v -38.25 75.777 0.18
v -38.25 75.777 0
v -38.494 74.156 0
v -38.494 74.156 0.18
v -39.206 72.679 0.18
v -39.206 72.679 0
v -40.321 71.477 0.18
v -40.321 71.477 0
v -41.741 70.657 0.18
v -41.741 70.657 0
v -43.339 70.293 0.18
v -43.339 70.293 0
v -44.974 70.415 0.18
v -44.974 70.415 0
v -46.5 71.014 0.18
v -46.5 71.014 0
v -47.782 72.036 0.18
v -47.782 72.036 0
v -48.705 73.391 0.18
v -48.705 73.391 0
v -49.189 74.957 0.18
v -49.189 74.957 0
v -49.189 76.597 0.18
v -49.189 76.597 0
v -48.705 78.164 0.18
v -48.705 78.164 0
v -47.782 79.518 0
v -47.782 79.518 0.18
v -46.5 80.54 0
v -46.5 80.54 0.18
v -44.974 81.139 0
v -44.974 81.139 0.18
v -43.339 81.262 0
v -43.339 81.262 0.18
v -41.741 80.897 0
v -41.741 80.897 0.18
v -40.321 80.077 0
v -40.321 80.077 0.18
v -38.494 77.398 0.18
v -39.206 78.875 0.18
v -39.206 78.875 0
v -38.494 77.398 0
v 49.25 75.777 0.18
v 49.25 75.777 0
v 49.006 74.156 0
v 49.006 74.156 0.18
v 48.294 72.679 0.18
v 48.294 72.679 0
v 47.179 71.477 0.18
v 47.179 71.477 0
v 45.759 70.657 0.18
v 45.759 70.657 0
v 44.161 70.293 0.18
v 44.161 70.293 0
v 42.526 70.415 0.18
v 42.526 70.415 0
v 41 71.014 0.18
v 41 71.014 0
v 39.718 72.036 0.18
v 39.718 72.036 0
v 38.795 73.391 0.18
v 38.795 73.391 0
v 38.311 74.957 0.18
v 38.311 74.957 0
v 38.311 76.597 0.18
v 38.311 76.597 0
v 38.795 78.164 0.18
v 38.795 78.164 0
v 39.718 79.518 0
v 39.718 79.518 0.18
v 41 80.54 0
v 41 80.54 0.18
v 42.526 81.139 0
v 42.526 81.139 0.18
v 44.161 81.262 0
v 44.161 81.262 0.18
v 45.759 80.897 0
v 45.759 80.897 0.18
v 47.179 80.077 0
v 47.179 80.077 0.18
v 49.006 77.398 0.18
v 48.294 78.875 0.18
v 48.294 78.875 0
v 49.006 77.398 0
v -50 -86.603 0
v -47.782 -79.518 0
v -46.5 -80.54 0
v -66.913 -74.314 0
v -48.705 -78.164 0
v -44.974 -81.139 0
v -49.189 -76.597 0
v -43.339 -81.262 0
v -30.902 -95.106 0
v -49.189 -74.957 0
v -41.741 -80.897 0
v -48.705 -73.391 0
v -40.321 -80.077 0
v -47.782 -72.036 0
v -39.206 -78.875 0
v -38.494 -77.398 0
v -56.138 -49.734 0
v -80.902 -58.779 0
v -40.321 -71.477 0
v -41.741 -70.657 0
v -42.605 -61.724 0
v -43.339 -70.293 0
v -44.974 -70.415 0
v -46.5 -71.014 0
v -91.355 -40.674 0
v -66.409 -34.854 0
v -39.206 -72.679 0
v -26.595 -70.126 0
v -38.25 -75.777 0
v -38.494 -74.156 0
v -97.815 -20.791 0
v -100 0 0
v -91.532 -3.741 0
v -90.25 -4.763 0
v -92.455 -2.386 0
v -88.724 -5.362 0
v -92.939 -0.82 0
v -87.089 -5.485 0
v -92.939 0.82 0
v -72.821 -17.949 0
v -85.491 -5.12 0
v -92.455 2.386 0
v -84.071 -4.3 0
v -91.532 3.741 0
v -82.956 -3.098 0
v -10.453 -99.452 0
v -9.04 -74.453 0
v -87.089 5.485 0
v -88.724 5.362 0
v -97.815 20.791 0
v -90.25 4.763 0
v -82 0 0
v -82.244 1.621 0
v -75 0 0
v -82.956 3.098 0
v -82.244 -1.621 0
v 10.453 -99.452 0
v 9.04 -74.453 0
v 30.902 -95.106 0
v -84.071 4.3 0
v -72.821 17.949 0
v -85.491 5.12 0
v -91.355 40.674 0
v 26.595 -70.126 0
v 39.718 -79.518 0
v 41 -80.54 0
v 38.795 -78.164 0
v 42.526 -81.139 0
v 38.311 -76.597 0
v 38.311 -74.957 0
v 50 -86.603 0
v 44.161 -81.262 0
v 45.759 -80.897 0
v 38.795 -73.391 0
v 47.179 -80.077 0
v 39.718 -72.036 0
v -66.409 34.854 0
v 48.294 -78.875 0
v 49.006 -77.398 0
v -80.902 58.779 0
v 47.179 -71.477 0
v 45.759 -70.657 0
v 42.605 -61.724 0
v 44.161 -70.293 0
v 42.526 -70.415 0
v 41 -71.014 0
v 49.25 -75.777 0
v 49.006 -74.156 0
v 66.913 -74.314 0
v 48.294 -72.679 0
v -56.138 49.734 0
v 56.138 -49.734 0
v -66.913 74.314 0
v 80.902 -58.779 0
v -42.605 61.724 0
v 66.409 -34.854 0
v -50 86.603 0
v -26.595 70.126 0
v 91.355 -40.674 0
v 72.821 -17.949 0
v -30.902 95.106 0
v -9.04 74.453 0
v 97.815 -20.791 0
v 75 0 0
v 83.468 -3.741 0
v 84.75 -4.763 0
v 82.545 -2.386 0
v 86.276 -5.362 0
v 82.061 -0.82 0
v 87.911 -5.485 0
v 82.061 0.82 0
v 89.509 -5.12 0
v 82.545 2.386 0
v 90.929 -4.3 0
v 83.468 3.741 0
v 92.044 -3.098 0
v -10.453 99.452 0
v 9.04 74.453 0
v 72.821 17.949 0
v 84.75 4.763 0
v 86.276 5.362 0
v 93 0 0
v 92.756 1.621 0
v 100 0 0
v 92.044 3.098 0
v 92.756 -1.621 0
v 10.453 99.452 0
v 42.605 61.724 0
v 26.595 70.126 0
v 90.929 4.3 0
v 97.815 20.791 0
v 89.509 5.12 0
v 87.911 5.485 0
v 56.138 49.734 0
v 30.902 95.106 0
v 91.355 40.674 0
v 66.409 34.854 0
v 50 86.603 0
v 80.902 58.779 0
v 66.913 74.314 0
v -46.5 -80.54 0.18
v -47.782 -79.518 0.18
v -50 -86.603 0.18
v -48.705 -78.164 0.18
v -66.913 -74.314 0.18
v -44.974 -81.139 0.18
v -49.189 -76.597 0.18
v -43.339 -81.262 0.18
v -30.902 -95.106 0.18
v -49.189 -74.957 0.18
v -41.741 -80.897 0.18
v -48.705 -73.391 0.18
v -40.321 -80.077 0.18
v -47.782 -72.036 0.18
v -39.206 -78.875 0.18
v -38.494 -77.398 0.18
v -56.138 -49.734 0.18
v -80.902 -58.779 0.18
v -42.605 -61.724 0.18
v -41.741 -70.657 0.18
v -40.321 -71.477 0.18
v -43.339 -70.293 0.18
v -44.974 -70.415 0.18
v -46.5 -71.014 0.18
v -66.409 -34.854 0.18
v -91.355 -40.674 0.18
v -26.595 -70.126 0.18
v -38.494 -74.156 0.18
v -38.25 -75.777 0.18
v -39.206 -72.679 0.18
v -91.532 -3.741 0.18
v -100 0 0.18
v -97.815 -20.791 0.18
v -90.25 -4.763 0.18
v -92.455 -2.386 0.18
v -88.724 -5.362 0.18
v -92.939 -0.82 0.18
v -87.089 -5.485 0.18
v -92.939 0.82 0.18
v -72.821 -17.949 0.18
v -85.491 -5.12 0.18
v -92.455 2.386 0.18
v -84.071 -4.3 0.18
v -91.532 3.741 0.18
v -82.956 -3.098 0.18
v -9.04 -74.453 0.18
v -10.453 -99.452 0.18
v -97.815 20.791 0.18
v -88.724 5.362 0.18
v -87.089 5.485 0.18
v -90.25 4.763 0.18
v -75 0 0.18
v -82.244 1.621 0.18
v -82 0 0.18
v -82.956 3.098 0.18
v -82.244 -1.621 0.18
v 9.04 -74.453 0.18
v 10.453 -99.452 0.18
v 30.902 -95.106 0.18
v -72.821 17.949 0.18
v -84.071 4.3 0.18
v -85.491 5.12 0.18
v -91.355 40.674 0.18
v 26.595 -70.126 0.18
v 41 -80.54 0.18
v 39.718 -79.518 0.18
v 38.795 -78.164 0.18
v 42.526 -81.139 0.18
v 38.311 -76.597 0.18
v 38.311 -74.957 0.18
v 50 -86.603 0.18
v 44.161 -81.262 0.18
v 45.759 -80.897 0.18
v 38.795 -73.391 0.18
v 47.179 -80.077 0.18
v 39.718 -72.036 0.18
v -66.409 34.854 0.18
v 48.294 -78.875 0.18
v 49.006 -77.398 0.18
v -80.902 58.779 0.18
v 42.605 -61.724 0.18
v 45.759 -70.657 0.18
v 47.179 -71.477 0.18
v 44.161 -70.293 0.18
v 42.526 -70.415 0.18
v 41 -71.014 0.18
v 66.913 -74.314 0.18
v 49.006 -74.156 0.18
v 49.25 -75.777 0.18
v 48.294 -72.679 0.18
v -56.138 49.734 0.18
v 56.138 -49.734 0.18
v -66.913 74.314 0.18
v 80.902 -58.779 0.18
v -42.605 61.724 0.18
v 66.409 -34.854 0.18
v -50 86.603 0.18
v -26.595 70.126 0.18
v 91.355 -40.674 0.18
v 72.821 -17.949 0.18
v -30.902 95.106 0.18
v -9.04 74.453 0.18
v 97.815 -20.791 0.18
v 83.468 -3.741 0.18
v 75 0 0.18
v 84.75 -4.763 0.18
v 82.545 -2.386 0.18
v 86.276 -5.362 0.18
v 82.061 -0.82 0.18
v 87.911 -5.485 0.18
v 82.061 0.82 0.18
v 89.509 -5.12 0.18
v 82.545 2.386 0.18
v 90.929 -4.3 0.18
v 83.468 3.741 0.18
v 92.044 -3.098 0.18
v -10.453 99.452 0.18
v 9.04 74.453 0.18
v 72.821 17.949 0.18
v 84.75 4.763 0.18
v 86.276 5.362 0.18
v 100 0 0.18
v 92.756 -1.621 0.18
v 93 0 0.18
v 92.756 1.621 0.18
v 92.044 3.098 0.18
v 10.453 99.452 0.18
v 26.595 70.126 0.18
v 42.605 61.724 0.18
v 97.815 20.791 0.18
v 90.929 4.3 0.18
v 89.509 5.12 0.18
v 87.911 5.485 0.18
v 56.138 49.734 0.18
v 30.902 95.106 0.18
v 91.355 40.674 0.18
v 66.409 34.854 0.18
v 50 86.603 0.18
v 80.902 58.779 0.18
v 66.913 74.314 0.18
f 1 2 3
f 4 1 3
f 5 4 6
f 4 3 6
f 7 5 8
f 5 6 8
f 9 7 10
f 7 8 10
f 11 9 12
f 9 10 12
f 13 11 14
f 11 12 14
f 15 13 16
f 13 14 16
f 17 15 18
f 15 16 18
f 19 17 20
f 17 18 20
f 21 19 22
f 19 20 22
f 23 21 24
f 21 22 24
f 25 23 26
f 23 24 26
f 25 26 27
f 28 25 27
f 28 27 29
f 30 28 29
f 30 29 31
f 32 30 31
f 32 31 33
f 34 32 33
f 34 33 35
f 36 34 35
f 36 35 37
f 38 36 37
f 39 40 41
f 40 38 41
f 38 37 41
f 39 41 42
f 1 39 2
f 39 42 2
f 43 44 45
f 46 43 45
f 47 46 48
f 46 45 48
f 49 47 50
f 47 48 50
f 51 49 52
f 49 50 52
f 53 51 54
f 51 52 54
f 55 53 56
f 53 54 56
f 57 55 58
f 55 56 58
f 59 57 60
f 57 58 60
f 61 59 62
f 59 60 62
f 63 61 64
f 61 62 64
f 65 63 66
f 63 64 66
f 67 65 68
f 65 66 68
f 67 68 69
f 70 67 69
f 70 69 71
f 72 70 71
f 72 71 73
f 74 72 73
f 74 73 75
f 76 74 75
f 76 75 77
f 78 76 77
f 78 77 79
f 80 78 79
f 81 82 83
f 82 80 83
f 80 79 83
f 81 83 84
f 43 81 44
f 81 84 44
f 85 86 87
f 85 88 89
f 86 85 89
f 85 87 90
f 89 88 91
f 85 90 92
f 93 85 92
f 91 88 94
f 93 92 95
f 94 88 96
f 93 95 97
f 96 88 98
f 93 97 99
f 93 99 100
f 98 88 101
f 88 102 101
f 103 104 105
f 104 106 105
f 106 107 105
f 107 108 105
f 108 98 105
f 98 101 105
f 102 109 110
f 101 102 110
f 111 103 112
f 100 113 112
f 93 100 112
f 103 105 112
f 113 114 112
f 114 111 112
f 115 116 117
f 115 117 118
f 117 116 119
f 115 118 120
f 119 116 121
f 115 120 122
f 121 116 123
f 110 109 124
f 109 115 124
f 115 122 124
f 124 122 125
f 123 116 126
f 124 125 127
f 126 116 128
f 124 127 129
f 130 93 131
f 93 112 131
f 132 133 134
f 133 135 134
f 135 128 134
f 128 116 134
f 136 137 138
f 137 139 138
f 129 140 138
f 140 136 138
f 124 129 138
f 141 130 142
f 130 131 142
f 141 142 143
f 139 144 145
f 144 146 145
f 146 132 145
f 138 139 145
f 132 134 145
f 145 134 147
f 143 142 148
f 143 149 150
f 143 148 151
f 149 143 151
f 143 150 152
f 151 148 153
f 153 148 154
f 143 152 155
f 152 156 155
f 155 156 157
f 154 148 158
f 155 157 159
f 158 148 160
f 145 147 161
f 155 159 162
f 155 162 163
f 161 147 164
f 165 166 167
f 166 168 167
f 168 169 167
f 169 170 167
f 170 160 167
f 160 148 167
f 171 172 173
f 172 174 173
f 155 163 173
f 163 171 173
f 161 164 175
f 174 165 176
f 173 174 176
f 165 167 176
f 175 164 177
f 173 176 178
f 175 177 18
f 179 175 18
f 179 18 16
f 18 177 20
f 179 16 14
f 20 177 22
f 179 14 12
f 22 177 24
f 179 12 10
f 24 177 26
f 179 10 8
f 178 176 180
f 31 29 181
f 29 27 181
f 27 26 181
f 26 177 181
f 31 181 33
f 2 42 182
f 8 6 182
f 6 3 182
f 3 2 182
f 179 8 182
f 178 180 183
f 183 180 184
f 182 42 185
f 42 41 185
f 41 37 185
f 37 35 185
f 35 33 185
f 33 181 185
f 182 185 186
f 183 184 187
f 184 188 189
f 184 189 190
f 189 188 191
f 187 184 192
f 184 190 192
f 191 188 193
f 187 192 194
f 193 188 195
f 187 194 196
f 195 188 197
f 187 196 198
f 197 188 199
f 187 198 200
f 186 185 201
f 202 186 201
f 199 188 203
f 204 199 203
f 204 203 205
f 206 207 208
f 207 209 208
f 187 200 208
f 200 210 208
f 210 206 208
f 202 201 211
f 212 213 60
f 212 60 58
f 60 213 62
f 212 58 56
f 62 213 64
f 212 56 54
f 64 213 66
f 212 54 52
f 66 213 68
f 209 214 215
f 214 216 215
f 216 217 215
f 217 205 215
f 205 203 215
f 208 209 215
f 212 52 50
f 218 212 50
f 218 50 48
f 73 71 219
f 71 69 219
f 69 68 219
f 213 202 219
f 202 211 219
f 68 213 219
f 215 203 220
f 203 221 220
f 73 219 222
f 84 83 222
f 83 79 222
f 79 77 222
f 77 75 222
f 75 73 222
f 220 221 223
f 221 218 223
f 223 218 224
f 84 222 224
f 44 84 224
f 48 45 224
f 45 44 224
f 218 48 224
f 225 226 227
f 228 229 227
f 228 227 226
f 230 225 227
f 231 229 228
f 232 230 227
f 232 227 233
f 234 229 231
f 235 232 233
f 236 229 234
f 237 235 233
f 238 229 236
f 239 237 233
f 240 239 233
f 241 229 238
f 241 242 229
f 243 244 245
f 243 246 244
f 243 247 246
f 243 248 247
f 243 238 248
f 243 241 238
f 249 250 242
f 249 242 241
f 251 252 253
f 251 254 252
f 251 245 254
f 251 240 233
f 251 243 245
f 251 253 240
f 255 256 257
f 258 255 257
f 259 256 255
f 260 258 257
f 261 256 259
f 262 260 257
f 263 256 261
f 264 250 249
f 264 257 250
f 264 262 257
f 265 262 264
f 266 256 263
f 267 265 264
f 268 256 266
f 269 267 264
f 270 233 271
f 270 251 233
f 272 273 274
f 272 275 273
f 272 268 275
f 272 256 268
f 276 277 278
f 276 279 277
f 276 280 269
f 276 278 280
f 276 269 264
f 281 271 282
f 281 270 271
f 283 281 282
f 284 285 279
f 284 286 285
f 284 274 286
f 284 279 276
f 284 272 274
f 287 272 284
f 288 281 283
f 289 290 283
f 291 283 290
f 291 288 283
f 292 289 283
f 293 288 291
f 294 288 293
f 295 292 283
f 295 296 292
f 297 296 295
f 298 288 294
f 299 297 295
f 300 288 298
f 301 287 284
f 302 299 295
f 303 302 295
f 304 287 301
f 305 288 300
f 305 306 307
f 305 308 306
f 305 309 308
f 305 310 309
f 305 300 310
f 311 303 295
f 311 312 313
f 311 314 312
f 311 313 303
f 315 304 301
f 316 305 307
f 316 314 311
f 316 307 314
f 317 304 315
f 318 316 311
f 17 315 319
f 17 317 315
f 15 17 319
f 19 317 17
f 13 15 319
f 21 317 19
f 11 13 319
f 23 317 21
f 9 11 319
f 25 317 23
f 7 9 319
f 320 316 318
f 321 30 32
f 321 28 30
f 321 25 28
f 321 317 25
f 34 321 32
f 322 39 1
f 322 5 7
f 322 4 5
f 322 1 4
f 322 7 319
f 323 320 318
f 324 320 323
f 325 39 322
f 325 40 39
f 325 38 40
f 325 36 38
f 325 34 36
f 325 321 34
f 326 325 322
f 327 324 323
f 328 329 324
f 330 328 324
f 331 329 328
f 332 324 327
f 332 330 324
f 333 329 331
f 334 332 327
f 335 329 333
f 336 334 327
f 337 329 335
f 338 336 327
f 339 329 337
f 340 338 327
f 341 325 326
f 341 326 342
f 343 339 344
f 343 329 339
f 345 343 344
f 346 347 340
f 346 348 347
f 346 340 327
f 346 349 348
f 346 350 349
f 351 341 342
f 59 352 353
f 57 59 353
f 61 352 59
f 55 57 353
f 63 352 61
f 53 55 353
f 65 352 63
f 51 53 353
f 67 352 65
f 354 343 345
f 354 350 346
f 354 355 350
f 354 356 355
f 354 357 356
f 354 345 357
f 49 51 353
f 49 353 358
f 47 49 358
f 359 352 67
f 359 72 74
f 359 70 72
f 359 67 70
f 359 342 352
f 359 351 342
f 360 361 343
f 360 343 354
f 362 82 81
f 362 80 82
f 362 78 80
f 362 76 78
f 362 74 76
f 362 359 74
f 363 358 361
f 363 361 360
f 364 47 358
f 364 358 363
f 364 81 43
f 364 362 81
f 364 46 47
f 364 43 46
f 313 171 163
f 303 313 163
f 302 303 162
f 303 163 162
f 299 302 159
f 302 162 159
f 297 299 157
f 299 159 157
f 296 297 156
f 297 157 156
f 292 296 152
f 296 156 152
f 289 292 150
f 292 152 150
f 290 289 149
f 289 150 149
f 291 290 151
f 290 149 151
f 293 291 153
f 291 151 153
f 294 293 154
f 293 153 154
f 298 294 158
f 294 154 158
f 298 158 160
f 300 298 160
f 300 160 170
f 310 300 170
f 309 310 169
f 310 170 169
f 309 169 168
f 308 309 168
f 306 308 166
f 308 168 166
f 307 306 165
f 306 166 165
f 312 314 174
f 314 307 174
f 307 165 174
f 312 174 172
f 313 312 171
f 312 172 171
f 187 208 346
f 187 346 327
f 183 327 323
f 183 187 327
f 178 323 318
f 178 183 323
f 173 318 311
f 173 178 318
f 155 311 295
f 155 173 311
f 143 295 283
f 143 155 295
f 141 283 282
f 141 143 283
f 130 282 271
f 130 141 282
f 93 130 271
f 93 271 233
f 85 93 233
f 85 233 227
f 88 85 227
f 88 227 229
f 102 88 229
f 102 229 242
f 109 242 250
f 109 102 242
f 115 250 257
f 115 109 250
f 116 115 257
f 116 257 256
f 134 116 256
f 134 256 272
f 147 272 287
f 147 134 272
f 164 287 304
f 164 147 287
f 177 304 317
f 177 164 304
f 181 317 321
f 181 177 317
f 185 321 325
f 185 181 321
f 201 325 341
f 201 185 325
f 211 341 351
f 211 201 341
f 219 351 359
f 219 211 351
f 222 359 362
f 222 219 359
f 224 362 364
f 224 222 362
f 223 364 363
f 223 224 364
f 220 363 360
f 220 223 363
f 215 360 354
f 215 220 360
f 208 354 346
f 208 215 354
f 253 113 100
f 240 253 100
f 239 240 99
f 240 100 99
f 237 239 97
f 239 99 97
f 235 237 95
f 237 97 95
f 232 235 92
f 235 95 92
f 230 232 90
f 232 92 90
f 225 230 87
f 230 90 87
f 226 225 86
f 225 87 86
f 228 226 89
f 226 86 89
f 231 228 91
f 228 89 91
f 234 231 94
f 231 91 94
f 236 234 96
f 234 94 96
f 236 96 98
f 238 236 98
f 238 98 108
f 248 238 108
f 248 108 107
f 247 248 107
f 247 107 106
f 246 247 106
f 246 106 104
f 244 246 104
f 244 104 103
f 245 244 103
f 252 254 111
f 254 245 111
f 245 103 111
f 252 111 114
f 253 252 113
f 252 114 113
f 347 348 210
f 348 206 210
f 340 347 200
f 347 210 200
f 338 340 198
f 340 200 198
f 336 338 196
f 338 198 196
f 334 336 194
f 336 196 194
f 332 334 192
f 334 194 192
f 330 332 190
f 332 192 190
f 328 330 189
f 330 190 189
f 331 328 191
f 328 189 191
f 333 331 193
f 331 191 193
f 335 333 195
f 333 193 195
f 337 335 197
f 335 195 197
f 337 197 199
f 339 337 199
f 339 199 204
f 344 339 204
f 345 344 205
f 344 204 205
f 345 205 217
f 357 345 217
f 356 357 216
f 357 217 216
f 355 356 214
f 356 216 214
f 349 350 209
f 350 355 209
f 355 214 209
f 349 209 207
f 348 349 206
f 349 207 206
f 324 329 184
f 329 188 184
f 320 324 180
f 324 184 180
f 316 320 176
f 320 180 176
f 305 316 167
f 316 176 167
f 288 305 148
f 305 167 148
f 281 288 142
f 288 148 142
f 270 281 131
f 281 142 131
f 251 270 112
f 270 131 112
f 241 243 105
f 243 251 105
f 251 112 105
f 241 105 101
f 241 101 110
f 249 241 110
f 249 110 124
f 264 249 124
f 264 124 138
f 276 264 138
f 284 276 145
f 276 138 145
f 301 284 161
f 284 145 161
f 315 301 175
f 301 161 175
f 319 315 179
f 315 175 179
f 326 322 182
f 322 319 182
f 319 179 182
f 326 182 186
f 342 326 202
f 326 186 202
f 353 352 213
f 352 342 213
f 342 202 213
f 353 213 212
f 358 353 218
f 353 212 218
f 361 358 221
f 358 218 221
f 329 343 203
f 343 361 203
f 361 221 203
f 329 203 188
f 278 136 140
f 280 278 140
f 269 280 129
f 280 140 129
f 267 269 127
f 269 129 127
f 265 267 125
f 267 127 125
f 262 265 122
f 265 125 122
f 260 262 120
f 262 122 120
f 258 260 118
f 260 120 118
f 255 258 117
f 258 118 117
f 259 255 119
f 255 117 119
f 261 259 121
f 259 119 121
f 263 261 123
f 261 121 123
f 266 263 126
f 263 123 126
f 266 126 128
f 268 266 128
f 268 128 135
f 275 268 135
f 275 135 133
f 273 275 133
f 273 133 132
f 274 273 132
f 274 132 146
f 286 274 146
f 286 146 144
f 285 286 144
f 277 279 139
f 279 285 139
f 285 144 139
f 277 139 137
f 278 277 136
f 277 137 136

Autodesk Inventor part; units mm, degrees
ref_plane "YZ Plane" through (0, 0, 0) normal (1, 0, 0) x (0, 1, 0)
ref_plane "XZ Plane" through (0, 0, 0) normal (0, 1, 0) x (-1, 0, 0)
ref_plane "工作平面1" through (0, 0, 0) normal (0, 0, 1) x (1, 0, 0)
sketch "草图1" plane through (0, 0, 0) normal (0, 0, 1) x (1, 0, 0)
  circle A0 centre (0, 0) radius 75 projected
  circle A1 centre (0, 0) radius 100 projected
  circle A2 centre (43.75, 75.7772) radius 5.5 projected
  circle A3 centre (87.5, 0) radius 5.5 projected
  circle A4 centre (-43.75, -75.7772) radius 5.5 projected
  circle A5 centre (-43.75, 75.7772) radius 5.5 projected
  circle A6 centre (-87.5, 0) radius 5.5 projected
  circle A7 centre (43.75, -75.7772) radius 5.5 projected
  point P0 (0, 0)
extrude "拉伸1" add sketch "草图1" along normal blind 0.18
properties part number "垫片4"
